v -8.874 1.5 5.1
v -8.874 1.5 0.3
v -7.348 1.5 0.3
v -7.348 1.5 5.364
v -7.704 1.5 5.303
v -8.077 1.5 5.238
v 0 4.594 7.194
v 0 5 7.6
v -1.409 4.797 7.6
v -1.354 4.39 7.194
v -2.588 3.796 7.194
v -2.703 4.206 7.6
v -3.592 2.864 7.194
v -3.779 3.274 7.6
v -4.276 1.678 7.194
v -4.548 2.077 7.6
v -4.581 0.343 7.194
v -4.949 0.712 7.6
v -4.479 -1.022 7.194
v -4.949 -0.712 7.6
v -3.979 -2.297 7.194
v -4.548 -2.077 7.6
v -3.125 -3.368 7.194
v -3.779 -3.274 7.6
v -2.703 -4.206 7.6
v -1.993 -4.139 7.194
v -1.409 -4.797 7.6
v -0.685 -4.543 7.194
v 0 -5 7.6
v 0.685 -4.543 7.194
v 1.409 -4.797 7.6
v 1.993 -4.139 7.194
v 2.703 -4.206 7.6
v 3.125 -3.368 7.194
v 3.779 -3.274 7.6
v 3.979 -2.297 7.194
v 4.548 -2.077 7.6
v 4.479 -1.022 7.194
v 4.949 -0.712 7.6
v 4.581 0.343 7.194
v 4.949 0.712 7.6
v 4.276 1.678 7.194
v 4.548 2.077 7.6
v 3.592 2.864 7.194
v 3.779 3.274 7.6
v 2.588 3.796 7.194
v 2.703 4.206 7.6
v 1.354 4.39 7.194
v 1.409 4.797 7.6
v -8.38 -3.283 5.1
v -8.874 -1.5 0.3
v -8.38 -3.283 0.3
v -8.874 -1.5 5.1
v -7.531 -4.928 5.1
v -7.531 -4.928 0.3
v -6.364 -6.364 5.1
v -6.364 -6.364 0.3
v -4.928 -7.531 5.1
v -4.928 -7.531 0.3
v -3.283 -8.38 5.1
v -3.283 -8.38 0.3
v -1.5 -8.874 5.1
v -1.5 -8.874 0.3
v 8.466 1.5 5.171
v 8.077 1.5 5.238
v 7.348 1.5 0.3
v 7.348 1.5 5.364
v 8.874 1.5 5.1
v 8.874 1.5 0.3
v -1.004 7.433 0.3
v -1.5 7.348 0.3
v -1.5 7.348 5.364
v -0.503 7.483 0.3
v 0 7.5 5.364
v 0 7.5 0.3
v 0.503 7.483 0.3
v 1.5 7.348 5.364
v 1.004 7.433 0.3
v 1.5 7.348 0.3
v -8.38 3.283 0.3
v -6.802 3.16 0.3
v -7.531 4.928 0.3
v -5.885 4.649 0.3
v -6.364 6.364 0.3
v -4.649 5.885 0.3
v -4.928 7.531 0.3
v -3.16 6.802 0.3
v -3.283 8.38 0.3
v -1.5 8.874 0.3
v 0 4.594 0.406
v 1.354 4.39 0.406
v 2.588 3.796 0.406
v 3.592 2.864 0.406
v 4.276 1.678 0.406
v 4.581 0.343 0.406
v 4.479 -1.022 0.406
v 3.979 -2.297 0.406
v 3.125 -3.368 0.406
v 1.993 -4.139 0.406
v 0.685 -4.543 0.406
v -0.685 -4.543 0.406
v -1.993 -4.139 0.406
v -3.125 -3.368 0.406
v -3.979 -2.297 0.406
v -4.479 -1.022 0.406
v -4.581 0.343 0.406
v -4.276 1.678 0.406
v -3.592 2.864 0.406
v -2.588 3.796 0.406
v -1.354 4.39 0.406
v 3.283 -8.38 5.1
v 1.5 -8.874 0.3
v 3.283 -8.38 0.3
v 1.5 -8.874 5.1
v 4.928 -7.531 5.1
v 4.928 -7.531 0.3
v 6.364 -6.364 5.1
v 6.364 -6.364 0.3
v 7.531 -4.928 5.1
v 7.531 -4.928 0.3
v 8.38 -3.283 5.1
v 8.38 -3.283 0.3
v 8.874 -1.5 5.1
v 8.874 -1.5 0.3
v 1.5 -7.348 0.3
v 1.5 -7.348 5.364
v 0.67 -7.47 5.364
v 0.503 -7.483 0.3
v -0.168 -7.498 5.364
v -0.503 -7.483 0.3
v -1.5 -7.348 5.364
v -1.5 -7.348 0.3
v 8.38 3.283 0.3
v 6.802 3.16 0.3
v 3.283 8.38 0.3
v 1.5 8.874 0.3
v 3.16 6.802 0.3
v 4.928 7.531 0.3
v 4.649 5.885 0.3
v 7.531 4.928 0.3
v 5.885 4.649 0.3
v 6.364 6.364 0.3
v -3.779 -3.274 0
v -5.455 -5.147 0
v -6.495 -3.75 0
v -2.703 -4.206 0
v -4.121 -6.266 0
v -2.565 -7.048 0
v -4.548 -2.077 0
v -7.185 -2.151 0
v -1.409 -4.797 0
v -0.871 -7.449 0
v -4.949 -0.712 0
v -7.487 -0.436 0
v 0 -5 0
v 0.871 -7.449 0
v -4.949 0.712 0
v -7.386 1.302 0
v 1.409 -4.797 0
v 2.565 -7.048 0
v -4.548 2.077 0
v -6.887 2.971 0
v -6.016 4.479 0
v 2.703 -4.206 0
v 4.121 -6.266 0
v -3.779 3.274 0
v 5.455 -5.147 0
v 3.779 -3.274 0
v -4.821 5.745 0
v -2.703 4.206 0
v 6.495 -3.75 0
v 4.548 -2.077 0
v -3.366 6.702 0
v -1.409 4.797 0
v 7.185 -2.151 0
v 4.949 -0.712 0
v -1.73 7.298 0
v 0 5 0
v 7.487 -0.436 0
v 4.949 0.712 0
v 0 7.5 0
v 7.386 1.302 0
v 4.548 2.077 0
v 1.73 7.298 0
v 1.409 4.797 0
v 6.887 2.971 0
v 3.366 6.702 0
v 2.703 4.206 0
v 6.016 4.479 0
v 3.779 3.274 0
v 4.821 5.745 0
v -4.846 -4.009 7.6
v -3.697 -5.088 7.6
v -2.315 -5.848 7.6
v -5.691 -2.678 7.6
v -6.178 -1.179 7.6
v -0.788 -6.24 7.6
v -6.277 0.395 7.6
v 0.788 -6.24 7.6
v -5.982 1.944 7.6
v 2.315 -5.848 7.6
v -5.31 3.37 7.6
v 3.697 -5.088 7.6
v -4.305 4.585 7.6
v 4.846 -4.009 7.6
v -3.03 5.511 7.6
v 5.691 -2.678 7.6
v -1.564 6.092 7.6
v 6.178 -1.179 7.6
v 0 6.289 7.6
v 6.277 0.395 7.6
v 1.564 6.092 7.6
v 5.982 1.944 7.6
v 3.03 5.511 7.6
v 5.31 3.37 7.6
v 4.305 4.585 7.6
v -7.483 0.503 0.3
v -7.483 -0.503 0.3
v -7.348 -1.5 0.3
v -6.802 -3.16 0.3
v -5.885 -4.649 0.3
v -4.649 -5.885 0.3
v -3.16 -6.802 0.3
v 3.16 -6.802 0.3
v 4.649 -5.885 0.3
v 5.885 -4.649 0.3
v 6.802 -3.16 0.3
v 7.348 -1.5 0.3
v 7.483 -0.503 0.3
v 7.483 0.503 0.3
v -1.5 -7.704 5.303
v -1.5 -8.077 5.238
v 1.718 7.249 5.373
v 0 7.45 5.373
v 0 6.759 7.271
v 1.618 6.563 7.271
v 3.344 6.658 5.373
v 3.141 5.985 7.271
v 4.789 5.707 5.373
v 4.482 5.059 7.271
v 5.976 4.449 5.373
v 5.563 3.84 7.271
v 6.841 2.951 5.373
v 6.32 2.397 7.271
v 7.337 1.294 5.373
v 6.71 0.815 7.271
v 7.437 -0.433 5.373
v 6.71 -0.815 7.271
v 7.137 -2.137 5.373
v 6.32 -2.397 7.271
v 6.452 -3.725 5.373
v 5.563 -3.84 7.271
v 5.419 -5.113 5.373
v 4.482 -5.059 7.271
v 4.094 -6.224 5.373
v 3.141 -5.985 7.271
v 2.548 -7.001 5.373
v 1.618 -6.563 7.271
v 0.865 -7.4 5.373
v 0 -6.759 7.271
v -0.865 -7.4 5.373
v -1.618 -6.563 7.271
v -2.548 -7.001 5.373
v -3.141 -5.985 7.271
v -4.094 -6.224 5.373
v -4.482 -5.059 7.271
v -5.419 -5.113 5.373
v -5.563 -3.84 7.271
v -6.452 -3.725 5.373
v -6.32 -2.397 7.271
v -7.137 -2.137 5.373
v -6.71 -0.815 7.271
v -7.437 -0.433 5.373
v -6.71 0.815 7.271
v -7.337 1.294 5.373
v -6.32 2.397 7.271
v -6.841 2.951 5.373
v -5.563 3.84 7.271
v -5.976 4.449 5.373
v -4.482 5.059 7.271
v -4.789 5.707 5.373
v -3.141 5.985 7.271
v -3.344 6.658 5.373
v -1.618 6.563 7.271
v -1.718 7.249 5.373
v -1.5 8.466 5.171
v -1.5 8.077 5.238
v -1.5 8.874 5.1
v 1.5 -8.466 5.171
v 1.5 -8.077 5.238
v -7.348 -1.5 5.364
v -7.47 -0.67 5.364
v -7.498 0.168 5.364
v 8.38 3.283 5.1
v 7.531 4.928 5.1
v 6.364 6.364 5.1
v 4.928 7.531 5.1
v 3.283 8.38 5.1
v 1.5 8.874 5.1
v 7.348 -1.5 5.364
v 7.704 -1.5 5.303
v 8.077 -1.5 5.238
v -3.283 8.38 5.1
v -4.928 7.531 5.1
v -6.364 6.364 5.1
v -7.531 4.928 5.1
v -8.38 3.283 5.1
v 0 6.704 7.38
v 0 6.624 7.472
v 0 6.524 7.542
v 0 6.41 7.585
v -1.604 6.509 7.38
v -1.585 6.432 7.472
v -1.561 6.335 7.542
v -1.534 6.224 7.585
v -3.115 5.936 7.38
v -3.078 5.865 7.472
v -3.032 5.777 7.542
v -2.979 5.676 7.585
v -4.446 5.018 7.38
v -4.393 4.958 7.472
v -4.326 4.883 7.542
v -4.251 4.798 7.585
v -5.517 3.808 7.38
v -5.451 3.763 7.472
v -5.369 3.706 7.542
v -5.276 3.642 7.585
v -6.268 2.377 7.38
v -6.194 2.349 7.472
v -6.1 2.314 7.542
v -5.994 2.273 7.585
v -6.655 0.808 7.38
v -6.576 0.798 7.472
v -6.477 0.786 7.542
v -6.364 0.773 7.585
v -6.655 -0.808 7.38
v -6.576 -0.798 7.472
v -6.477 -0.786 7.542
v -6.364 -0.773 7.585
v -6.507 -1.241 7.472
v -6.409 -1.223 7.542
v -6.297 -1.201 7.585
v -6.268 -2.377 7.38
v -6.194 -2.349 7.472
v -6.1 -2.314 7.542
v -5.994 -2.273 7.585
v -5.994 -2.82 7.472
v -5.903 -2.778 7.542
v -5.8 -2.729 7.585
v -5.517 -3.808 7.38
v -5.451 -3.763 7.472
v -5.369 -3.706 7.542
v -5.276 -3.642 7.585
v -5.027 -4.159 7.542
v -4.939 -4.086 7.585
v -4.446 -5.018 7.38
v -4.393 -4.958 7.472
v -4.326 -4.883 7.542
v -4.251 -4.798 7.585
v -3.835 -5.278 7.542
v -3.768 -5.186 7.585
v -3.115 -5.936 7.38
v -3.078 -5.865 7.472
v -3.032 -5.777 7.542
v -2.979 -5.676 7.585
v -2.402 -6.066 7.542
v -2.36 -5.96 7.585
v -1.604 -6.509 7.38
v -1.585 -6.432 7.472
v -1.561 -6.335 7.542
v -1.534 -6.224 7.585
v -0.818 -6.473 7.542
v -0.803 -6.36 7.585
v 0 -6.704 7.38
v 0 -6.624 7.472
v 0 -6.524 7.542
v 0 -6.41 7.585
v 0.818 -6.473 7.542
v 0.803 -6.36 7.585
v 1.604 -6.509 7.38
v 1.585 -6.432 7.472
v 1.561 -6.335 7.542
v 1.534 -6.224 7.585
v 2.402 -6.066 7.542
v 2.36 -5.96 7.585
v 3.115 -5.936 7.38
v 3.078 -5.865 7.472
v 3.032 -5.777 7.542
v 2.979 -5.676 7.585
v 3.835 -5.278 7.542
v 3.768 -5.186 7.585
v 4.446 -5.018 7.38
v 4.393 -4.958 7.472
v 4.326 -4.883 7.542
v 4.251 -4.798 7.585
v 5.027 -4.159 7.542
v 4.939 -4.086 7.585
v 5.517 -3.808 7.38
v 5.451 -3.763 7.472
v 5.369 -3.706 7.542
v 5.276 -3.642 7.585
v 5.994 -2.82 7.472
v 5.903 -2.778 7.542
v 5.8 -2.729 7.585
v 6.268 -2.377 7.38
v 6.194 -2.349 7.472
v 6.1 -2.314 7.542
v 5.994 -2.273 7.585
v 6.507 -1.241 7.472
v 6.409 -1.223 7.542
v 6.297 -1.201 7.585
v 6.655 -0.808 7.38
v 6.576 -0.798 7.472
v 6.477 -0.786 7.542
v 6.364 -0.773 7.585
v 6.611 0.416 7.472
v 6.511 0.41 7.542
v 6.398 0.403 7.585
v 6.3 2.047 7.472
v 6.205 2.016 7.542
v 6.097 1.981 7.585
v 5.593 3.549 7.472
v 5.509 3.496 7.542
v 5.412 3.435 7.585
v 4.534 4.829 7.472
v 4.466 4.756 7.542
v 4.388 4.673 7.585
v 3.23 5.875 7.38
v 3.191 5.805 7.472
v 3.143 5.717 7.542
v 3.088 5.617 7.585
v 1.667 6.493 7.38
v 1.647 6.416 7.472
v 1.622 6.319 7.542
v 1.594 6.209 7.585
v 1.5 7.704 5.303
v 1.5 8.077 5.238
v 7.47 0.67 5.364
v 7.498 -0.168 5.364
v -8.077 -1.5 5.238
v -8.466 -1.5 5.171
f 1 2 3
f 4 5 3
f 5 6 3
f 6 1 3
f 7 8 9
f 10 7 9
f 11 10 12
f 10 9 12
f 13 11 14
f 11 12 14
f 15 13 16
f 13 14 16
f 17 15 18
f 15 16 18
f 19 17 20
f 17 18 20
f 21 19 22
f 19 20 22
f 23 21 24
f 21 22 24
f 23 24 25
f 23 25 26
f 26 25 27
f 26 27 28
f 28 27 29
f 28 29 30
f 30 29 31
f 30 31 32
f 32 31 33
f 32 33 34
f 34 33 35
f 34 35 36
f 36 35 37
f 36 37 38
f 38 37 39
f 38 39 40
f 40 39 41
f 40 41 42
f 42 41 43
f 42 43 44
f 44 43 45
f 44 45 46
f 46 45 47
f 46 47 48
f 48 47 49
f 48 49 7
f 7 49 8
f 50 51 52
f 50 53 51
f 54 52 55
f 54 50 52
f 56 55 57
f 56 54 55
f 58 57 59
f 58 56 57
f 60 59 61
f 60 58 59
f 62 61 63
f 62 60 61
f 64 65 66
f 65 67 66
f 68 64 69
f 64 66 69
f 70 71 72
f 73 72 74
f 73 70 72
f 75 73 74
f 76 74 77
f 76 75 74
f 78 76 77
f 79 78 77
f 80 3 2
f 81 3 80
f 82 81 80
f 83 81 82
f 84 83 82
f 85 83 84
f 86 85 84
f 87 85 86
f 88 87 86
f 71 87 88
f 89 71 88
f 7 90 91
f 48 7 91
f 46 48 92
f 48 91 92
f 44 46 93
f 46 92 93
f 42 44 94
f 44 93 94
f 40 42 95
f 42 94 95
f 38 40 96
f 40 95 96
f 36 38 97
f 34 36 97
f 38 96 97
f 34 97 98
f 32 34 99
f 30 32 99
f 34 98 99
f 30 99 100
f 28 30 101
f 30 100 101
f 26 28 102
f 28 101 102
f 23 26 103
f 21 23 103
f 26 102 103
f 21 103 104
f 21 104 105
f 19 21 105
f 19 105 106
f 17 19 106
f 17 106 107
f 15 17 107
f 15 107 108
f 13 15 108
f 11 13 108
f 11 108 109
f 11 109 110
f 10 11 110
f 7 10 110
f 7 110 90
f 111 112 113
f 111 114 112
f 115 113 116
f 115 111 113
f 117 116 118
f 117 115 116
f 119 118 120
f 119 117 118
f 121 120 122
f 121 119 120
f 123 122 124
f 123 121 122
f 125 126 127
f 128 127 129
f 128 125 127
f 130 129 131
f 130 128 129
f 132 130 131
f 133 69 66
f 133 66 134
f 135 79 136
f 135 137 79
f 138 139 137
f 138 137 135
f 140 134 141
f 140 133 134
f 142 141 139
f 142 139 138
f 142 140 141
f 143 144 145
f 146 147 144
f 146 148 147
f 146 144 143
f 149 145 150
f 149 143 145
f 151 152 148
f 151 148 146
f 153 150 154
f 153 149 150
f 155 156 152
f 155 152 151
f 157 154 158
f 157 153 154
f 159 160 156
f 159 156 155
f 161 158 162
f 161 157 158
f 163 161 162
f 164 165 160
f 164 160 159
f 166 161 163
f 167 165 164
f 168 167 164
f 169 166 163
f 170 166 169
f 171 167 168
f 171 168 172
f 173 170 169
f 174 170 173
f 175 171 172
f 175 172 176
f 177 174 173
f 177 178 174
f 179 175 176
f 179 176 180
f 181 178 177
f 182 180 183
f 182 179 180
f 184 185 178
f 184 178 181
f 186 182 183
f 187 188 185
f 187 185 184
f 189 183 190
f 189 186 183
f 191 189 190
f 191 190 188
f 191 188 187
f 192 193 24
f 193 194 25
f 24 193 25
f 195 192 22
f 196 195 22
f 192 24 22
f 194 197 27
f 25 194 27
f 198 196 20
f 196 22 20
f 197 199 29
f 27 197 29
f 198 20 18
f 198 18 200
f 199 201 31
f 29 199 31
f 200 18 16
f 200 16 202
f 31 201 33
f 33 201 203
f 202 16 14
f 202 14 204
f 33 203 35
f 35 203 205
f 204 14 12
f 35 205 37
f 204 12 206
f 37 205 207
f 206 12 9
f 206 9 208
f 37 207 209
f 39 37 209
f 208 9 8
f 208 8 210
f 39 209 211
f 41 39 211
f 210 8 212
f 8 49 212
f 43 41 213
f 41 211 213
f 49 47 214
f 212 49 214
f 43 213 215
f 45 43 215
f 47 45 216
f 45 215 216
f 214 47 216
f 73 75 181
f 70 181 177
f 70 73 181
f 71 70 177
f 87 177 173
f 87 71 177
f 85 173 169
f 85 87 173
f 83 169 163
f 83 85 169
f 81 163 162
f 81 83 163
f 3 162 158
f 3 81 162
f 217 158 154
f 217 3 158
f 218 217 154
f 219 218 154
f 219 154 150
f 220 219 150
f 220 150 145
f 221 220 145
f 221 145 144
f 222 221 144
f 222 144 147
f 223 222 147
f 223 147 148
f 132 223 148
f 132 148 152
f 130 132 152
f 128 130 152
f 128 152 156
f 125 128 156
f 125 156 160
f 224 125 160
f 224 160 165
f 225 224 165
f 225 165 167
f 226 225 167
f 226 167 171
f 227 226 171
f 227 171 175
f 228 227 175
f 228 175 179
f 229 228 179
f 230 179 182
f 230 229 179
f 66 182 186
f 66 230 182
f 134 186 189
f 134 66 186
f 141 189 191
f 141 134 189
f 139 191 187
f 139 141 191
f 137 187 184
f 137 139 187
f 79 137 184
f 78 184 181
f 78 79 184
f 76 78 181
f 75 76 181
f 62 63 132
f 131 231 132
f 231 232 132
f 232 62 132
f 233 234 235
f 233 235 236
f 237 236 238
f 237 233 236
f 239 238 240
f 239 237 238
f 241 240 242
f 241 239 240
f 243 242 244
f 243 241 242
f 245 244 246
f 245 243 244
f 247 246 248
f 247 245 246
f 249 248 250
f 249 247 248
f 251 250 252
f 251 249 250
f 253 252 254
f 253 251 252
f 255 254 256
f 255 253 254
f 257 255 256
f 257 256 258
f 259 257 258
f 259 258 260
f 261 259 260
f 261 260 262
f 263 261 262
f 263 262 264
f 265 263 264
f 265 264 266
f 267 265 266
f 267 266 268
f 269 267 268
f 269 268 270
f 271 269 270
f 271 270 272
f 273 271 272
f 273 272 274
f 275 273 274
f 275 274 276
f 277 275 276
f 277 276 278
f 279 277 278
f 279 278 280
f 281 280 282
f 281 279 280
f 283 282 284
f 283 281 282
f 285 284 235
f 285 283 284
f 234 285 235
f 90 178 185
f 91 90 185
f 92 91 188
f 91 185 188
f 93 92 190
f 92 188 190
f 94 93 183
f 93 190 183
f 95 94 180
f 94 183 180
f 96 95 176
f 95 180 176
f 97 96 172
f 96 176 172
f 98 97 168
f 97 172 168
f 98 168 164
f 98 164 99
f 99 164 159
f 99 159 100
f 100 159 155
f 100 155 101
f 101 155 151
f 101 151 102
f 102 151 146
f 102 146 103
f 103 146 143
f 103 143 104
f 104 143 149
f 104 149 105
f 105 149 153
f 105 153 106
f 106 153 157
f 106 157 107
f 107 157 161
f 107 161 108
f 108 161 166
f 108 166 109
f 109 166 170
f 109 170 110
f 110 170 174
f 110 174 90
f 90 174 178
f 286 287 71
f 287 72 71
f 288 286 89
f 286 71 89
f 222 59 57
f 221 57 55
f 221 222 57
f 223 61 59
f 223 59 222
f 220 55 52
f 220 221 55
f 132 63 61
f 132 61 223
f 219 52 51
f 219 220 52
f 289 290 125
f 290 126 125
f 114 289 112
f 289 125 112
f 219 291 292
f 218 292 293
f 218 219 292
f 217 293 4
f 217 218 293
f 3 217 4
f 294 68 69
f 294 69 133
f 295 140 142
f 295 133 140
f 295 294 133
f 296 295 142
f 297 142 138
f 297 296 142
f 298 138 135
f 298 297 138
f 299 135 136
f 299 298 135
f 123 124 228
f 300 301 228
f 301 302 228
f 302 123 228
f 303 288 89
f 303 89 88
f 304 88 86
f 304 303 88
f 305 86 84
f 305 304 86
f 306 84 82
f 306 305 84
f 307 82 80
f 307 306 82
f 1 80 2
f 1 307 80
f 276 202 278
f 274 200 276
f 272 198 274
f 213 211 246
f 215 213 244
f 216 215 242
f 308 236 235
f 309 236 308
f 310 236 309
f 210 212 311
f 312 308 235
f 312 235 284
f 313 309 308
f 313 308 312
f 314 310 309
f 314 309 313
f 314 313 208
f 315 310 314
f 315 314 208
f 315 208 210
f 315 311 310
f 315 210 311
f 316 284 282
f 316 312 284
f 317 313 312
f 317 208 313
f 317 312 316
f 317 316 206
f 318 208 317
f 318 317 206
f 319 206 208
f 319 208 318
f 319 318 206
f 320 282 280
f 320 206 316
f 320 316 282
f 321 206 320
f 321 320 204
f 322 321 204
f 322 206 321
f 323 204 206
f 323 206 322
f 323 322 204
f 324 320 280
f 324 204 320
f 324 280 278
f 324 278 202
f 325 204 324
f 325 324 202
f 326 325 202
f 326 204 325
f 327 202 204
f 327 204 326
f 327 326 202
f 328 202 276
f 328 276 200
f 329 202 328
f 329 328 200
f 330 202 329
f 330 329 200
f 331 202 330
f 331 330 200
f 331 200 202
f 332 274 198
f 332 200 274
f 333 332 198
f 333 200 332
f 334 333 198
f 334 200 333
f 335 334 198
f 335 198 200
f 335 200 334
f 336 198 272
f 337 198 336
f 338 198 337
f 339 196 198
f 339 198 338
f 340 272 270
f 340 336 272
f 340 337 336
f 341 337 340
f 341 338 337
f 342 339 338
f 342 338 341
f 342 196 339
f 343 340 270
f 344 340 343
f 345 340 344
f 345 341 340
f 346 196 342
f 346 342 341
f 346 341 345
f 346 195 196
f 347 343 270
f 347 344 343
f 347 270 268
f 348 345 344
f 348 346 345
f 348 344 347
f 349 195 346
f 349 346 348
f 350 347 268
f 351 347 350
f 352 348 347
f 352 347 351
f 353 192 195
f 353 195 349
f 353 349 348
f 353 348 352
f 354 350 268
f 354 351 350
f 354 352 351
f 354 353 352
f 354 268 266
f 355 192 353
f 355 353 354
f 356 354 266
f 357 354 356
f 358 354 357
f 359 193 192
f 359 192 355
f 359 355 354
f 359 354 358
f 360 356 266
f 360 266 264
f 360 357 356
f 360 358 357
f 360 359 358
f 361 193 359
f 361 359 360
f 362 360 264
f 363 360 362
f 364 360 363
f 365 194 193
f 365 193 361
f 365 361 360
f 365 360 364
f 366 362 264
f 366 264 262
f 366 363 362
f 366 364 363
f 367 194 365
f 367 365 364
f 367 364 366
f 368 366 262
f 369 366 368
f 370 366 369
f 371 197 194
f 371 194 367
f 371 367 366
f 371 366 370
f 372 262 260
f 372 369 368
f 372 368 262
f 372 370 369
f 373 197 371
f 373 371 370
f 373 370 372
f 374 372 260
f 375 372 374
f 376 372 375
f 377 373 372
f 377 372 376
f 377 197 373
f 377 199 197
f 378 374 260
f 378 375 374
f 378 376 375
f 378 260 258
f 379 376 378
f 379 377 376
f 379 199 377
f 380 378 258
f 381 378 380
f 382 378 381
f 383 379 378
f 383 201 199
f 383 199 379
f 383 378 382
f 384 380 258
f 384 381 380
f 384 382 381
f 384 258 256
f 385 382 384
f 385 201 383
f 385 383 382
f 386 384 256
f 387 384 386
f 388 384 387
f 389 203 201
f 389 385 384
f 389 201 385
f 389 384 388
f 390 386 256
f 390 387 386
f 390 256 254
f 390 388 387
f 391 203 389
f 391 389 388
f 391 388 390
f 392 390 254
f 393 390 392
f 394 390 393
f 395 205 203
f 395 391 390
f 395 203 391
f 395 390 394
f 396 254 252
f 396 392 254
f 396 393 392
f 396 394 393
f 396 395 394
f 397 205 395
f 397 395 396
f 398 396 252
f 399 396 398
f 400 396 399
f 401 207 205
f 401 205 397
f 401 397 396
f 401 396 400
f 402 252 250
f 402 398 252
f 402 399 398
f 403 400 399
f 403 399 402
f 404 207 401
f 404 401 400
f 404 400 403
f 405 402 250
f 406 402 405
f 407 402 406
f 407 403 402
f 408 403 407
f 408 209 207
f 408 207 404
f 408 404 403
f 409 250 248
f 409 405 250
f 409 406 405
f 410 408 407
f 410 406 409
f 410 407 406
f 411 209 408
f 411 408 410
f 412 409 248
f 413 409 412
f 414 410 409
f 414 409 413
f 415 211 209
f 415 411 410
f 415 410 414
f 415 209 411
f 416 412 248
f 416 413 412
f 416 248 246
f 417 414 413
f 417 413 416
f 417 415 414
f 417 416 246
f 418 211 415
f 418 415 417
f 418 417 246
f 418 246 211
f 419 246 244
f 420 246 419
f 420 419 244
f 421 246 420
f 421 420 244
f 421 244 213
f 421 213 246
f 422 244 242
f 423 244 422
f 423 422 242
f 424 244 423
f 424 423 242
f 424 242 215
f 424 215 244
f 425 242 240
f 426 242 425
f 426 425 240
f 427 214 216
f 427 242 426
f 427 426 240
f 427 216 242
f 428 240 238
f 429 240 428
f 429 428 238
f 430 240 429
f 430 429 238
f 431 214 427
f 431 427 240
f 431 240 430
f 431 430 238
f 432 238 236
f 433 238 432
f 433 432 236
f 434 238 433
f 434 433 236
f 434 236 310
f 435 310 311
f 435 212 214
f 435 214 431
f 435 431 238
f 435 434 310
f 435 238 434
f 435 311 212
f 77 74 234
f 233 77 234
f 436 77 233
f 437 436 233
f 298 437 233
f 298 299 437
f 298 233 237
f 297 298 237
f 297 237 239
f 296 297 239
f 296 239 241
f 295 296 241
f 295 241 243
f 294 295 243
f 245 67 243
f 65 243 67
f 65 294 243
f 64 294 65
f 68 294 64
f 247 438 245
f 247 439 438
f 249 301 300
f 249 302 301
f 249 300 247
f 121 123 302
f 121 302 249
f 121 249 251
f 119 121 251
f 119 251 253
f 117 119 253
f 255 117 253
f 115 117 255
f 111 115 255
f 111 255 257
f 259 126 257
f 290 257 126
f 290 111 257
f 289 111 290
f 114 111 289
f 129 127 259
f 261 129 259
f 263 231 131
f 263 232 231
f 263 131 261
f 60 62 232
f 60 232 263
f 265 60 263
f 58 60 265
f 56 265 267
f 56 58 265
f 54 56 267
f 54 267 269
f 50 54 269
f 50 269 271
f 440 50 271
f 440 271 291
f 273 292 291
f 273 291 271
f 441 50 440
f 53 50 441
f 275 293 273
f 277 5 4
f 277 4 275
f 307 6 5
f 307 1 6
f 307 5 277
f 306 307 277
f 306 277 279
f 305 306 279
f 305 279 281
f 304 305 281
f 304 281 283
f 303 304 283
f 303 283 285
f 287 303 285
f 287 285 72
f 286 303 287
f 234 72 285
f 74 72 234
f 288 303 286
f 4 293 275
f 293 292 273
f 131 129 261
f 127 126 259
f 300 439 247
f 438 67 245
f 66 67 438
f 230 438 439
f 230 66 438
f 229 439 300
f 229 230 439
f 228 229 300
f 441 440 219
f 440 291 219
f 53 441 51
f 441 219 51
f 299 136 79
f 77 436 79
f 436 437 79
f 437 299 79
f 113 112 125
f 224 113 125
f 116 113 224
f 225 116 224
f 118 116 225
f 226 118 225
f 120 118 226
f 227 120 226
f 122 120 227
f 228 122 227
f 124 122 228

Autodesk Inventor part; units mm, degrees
sketch "Skizze_1" plane through (0, 0, 0) normal (1, 0, 0) x (0, 1, 0)
  line L0 (0, 0) -> (0, 7.6)
  line L1 (6.2894, 7.6) -> (5, 7.6)
  line L2 (5, 7.6) -> (4.594, 7.194)
  line L3 (4.594, 7.194) -> (4.594, 0.406)
  line L4 (4.594, 0.406) -> (5, 0)
  line L5 (5, 0) -> (7.5, 0)
  line L6 (7.5, 0) -> (7.5, 0.3)
  line L7 (7.5, 0.3) -> (9, 0.3)
  line L8 (9, 0.3) -> (9, 5.1)
  line L9 (9, 5.1) -> (7.45, 5.3733)
  line L10 (7.45, 5.3733) -> (6.7593, 7.271)
  arc A0 (6.7593, 7.271) -> (6.2894, 7.6) centre (6.2894, 7.1) ccw
revolve "Revolution1" add sketch "Skizze_1" angle 360 about axis through (0, 0, 0) along (0, 0, -1)
thread "Thread1" size "M10x0.75" class "6H" standard "ISO Metric profile" full length
sketch "Skizze_2" plane through (0, 0, 0) normal (0, 0, 1) x (1, 0, 0)
  line L0 (-18, 18) -> (-18, -18)
  line L1 (-18, -18) -> (18, -18)
  line L2 (18, -18) -> (18, 18)
  line L3 (18, 18) -> (-18, 18)
  arc A0 (-9.8869, -1.5) -> (-1.5, -9.8869) centre (0, 0) ccw
  line L4 (-1.5, -9.8869) -> (-1.5, -7.3485)
  arc A1 (-1.5, -7.3485) -> (1.5, -7.3485) centre (0, 0) ccw
  line L5 (1.5, -7.3485) -> (1.5, -9.8869)
  arc A2 (1.5, -9.8869) -> (9.8869, -1.5) centre (0, 0) ccw
  line L6 (9.8869, -1.5) -> (7.3485, -1.5)
  arc A3 (7.3485, -1.5) -> (7.3485, 1.5) centre (0, 0) ccw
  line L7 (7.3485, 1.5) -> (9.8869, 1.5)
  arc A4 (9.8869, 1.5) -> (1.5, 9.8869) centre (0, 0) ccw
  line L8 (1.5, 9.8869) -> (1.5, 7.3485)
  arc A5 (1.5, 7.3485) -> (-1.5, 7.3485) centre (0, 0) ccw
  line L9 (-1.5, 7.3485) -> (-1.5, 9.8869)
  arc A6 (-1.5, 9.8869) -> (-9.8869, 1.5) centre (0, 0) ccw
  line L10 (-9.8869, 1.5) -> (-7.3485, 1.5)
  arc A7 (-7.3485, 1.5) -> (-7.3485, -1.5) centre (0, 0) ccw
  line L11 (-7.3485, -1.5) -> (-9.8869, -1.5)
extrude "Extrusion1" cut sketch "Skizze_2" along normal blind 7.6
ref_plane "ANBAU_XY" through (0, 0, 0) normal (0, 0, 1) x (1, 0, 0)
ref_plane "ANBAU_YZ" through (0, 0, 0) normal (1, 0, 0) x (0, 1, 0)
ref_plane "ANBAU_ZX" through (0, 0, 0) normal (0, 1, 0) x (0, 0, 1)
properties part number "717739 GUK M10x0.75"
